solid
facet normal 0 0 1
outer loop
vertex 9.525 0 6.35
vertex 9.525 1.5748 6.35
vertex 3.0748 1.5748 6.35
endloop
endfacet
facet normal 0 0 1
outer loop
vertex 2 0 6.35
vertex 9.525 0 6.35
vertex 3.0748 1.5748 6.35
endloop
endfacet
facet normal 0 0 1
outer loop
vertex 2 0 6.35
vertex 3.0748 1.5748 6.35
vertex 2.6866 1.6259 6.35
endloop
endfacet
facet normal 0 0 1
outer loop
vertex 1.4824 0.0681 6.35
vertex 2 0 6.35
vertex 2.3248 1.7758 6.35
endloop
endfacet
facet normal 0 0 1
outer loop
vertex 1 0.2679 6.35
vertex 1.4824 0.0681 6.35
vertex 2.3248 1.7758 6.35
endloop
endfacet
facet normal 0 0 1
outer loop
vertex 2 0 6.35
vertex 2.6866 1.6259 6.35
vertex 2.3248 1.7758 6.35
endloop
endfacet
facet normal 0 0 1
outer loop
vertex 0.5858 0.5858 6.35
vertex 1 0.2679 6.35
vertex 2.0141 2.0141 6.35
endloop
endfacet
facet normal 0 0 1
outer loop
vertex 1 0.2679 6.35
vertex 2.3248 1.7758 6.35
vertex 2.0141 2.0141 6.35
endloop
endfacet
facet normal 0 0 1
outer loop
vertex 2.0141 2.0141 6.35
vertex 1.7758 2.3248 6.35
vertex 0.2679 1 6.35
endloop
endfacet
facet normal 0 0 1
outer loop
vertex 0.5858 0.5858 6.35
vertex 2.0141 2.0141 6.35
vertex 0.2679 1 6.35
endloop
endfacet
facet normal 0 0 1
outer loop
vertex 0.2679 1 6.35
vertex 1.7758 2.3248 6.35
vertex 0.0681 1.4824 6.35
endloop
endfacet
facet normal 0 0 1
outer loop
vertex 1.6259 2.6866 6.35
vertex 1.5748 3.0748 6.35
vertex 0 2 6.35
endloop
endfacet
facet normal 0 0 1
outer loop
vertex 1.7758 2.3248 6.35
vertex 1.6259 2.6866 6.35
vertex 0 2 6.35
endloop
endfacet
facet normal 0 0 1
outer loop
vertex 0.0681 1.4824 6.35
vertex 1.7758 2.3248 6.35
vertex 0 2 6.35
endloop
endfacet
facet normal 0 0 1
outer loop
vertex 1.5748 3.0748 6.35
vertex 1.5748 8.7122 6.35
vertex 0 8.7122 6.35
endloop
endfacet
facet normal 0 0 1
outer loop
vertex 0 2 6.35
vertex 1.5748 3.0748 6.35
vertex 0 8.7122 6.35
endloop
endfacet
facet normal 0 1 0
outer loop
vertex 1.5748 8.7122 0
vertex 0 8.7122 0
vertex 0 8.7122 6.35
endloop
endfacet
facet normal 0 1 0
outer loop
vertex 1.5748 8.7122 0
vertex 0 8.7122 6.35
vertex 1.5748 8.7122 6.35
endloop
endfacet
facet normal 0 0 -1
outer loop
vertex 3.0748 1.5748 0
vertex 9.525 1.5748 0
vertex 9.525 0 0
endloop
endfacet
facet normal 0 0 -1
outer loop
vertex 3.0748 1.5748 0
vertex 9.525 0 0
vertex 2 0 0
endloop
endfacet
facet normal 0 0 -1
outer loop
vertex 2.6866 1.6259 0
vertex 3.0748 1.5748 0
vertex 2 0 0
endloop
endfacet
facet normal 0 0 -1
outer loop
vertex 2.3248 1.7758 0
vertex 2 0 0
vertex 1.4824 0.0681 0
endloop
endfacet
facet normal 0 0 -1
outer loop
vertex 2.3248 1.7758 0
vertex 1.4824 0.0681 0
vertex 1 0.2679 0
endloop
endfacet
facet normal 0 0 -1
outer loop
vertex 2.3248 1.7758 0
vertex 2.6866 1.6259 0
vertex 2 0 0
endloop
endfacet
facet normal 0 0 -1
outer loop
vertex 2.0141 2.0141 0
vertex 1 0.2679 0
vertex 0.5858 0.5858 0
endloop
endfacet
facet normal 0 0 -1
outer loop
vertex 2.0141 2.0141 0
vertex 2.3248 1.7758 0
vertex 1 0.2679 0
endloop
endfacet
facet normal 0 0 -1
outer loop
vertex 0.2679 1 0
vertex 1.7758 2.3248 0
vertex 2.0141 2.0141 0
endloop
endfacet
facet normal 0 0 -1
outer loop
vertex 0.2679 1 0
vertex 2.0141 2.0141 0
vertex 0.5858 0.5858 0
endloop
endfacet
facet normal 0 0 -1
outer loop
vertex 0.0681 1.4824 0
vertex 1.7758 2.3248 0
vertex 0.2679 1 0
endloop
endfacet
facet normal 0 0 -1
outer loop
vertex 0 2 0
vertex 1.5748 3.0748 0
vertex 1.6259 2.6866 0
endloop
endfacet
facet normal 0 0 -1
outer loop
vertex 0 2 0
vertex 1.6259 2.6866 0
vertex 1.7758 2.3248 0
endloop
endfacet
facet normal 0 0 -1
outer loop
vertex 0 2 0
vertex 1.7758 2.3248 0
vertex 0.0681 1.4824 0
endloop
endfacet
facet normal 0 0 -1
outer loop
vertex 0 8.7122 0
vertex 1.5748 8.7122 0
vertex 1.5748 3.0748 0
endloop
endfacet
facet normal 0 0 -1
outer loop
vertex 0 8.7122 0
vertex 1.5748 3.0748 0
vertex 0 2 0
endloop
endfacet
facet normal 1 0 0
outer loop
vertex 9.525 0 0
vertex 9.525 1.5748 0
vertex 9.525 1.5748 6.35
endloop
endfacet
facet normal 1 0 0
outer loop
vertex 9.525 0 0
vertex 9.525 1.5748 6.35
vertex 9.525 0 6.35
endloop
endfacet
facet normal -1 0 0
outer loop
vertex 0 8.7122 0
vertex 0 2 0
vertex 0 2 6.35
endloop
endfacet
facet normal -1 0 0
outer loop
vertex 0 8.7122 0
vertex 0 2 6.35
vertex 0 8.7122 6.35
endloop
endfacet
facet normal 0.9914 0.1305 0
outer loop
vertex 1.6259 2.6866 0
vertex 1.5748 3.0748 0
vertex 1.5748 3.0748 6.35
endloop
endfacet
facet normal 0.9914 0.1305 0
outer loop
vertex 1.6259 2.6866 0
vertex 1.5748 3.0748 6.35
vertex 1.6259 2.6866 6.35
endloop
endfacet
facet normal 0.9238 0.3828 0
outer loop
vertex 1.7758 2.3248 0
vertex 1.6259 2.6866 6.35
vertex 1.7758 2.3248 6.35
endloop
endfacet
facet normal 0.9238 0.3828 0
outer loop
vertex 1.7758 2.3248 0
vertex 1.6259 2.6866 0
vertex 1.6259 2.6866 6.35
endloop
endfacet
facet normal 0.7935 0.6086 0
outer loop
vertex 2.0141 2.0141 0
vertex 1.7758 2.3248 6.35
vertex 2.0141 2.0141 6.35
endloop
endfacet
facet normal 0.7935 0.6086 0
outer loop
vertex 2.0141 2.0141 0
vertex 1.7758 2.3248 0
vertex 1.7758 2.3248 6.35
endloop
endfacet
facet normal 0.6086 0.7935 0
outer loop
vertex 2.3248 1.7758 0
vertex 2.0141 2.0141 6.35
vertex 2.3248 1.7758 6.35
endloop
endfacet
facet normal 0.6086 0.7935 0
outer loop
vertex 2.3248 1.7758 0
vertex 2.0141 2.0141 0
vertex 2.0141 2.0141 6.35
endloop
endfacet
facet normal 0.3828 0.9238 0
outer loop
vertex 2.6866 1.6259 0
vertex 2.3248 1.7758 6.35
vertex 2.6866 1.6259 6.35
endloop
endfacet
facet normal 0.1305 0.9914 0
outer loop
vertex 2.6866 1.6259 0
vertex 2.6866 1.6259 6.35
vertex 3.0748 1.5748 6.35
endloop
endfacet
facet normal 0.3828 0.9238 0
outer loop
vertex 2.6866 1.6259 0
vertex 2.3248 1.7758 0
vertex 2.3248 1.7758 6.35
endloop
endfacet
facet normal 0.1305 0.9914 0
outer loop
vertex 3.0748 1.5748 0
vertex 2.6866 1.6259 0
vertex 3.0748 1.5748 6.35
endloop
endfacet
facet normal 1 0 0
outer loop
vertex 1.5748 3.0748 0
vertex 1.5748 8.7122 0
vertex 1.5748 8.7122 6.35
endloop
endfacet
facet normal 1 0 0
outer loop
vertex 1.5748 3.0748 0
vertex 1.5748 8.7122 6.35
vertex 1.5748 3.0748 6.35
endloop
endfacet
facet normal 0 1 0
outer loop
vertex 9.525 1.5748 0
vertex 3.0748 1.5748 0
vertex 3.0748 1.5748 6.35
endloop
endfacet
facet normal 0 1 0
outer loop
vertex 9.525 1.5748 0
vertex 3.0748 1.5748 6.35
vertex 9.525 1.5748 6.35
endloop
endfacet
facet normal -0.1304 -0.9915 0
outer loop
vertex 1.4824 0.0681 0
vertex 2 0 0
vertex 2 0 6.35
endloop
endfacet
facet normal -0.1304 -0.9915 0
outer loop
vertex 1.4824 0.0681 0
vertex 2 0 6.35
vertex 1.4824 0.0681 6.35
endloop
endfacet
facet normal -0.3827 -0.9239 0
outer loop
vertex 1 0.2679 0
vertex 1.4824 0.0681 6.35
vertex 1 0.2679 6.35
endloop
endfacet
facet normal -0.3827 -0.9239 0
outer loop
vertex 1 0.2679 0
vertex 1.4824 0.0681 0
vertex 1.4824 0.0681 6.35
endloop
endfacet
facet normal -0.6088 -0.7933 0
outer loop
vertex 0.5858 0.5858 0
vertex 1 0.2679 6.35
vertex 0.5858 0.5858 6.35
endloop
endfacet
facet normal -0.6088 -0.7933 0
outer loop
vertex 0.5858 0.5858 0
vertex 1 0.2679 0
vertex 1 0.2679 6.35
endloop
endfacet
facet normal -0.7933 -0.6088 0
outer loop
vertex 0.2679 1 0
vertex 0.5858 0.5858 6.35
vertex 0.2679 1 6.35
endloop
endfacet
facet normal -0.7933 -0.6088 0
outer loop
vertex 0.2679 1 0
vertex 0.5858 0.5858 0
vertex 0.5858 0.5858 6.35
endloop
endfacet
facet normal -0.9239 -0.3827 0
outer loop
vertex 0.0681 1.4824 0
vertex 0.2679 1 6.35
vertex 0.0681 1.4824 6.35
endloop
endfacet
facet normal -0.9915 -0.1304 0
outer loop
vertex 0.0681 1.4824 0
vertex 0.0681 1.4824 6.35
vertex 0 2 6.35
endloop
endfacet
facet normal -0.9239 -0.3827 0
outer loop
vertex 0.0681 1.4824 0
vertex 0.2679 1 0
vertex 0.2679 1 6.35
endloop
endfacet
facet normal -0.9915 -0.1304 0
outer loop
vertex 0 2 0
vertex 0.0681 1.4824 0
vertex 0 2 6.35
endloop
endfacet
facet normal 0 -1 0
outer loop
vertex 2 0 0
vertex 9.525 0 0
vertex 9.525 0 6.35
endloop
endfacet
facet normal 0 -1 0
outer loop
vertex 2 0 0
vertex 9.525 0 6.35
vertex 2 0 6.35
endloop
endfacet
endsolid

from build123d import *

# Parameters (mm, degrees)
BOSS_EXTRUDE1_DEPTH = 6.35


with BuildPart() as part:
    # Sketch1 → Boss-Extrude1 (new body)
    with BuildSketch(Plane.XY):
        with BuildLine():
            Line((0, 2), (0, 8.7122))
            Line((0, 8.7122), (1.5748, 8.7122))
            Line((1.5748, 8.7122), (1.5748, 3.0748))
            ThreePointArc((1.5748, 3.0748), (2.014139828, 2.014139828), (3.0748, 1.5748))
            Line((3.0748, 1.5748), (9.525, 1.5748))
            Line((9.525, 1.5748), (9.525, 0))
            Line((9.525, 0), (2, 0))
            ThreePointArc((2, 0), (0.585786438, 0.585786438), (0, 2))
        make_face()
    extrude(amount=BOSS_EXTRUDE1_DEPTH)


solid = part.part
